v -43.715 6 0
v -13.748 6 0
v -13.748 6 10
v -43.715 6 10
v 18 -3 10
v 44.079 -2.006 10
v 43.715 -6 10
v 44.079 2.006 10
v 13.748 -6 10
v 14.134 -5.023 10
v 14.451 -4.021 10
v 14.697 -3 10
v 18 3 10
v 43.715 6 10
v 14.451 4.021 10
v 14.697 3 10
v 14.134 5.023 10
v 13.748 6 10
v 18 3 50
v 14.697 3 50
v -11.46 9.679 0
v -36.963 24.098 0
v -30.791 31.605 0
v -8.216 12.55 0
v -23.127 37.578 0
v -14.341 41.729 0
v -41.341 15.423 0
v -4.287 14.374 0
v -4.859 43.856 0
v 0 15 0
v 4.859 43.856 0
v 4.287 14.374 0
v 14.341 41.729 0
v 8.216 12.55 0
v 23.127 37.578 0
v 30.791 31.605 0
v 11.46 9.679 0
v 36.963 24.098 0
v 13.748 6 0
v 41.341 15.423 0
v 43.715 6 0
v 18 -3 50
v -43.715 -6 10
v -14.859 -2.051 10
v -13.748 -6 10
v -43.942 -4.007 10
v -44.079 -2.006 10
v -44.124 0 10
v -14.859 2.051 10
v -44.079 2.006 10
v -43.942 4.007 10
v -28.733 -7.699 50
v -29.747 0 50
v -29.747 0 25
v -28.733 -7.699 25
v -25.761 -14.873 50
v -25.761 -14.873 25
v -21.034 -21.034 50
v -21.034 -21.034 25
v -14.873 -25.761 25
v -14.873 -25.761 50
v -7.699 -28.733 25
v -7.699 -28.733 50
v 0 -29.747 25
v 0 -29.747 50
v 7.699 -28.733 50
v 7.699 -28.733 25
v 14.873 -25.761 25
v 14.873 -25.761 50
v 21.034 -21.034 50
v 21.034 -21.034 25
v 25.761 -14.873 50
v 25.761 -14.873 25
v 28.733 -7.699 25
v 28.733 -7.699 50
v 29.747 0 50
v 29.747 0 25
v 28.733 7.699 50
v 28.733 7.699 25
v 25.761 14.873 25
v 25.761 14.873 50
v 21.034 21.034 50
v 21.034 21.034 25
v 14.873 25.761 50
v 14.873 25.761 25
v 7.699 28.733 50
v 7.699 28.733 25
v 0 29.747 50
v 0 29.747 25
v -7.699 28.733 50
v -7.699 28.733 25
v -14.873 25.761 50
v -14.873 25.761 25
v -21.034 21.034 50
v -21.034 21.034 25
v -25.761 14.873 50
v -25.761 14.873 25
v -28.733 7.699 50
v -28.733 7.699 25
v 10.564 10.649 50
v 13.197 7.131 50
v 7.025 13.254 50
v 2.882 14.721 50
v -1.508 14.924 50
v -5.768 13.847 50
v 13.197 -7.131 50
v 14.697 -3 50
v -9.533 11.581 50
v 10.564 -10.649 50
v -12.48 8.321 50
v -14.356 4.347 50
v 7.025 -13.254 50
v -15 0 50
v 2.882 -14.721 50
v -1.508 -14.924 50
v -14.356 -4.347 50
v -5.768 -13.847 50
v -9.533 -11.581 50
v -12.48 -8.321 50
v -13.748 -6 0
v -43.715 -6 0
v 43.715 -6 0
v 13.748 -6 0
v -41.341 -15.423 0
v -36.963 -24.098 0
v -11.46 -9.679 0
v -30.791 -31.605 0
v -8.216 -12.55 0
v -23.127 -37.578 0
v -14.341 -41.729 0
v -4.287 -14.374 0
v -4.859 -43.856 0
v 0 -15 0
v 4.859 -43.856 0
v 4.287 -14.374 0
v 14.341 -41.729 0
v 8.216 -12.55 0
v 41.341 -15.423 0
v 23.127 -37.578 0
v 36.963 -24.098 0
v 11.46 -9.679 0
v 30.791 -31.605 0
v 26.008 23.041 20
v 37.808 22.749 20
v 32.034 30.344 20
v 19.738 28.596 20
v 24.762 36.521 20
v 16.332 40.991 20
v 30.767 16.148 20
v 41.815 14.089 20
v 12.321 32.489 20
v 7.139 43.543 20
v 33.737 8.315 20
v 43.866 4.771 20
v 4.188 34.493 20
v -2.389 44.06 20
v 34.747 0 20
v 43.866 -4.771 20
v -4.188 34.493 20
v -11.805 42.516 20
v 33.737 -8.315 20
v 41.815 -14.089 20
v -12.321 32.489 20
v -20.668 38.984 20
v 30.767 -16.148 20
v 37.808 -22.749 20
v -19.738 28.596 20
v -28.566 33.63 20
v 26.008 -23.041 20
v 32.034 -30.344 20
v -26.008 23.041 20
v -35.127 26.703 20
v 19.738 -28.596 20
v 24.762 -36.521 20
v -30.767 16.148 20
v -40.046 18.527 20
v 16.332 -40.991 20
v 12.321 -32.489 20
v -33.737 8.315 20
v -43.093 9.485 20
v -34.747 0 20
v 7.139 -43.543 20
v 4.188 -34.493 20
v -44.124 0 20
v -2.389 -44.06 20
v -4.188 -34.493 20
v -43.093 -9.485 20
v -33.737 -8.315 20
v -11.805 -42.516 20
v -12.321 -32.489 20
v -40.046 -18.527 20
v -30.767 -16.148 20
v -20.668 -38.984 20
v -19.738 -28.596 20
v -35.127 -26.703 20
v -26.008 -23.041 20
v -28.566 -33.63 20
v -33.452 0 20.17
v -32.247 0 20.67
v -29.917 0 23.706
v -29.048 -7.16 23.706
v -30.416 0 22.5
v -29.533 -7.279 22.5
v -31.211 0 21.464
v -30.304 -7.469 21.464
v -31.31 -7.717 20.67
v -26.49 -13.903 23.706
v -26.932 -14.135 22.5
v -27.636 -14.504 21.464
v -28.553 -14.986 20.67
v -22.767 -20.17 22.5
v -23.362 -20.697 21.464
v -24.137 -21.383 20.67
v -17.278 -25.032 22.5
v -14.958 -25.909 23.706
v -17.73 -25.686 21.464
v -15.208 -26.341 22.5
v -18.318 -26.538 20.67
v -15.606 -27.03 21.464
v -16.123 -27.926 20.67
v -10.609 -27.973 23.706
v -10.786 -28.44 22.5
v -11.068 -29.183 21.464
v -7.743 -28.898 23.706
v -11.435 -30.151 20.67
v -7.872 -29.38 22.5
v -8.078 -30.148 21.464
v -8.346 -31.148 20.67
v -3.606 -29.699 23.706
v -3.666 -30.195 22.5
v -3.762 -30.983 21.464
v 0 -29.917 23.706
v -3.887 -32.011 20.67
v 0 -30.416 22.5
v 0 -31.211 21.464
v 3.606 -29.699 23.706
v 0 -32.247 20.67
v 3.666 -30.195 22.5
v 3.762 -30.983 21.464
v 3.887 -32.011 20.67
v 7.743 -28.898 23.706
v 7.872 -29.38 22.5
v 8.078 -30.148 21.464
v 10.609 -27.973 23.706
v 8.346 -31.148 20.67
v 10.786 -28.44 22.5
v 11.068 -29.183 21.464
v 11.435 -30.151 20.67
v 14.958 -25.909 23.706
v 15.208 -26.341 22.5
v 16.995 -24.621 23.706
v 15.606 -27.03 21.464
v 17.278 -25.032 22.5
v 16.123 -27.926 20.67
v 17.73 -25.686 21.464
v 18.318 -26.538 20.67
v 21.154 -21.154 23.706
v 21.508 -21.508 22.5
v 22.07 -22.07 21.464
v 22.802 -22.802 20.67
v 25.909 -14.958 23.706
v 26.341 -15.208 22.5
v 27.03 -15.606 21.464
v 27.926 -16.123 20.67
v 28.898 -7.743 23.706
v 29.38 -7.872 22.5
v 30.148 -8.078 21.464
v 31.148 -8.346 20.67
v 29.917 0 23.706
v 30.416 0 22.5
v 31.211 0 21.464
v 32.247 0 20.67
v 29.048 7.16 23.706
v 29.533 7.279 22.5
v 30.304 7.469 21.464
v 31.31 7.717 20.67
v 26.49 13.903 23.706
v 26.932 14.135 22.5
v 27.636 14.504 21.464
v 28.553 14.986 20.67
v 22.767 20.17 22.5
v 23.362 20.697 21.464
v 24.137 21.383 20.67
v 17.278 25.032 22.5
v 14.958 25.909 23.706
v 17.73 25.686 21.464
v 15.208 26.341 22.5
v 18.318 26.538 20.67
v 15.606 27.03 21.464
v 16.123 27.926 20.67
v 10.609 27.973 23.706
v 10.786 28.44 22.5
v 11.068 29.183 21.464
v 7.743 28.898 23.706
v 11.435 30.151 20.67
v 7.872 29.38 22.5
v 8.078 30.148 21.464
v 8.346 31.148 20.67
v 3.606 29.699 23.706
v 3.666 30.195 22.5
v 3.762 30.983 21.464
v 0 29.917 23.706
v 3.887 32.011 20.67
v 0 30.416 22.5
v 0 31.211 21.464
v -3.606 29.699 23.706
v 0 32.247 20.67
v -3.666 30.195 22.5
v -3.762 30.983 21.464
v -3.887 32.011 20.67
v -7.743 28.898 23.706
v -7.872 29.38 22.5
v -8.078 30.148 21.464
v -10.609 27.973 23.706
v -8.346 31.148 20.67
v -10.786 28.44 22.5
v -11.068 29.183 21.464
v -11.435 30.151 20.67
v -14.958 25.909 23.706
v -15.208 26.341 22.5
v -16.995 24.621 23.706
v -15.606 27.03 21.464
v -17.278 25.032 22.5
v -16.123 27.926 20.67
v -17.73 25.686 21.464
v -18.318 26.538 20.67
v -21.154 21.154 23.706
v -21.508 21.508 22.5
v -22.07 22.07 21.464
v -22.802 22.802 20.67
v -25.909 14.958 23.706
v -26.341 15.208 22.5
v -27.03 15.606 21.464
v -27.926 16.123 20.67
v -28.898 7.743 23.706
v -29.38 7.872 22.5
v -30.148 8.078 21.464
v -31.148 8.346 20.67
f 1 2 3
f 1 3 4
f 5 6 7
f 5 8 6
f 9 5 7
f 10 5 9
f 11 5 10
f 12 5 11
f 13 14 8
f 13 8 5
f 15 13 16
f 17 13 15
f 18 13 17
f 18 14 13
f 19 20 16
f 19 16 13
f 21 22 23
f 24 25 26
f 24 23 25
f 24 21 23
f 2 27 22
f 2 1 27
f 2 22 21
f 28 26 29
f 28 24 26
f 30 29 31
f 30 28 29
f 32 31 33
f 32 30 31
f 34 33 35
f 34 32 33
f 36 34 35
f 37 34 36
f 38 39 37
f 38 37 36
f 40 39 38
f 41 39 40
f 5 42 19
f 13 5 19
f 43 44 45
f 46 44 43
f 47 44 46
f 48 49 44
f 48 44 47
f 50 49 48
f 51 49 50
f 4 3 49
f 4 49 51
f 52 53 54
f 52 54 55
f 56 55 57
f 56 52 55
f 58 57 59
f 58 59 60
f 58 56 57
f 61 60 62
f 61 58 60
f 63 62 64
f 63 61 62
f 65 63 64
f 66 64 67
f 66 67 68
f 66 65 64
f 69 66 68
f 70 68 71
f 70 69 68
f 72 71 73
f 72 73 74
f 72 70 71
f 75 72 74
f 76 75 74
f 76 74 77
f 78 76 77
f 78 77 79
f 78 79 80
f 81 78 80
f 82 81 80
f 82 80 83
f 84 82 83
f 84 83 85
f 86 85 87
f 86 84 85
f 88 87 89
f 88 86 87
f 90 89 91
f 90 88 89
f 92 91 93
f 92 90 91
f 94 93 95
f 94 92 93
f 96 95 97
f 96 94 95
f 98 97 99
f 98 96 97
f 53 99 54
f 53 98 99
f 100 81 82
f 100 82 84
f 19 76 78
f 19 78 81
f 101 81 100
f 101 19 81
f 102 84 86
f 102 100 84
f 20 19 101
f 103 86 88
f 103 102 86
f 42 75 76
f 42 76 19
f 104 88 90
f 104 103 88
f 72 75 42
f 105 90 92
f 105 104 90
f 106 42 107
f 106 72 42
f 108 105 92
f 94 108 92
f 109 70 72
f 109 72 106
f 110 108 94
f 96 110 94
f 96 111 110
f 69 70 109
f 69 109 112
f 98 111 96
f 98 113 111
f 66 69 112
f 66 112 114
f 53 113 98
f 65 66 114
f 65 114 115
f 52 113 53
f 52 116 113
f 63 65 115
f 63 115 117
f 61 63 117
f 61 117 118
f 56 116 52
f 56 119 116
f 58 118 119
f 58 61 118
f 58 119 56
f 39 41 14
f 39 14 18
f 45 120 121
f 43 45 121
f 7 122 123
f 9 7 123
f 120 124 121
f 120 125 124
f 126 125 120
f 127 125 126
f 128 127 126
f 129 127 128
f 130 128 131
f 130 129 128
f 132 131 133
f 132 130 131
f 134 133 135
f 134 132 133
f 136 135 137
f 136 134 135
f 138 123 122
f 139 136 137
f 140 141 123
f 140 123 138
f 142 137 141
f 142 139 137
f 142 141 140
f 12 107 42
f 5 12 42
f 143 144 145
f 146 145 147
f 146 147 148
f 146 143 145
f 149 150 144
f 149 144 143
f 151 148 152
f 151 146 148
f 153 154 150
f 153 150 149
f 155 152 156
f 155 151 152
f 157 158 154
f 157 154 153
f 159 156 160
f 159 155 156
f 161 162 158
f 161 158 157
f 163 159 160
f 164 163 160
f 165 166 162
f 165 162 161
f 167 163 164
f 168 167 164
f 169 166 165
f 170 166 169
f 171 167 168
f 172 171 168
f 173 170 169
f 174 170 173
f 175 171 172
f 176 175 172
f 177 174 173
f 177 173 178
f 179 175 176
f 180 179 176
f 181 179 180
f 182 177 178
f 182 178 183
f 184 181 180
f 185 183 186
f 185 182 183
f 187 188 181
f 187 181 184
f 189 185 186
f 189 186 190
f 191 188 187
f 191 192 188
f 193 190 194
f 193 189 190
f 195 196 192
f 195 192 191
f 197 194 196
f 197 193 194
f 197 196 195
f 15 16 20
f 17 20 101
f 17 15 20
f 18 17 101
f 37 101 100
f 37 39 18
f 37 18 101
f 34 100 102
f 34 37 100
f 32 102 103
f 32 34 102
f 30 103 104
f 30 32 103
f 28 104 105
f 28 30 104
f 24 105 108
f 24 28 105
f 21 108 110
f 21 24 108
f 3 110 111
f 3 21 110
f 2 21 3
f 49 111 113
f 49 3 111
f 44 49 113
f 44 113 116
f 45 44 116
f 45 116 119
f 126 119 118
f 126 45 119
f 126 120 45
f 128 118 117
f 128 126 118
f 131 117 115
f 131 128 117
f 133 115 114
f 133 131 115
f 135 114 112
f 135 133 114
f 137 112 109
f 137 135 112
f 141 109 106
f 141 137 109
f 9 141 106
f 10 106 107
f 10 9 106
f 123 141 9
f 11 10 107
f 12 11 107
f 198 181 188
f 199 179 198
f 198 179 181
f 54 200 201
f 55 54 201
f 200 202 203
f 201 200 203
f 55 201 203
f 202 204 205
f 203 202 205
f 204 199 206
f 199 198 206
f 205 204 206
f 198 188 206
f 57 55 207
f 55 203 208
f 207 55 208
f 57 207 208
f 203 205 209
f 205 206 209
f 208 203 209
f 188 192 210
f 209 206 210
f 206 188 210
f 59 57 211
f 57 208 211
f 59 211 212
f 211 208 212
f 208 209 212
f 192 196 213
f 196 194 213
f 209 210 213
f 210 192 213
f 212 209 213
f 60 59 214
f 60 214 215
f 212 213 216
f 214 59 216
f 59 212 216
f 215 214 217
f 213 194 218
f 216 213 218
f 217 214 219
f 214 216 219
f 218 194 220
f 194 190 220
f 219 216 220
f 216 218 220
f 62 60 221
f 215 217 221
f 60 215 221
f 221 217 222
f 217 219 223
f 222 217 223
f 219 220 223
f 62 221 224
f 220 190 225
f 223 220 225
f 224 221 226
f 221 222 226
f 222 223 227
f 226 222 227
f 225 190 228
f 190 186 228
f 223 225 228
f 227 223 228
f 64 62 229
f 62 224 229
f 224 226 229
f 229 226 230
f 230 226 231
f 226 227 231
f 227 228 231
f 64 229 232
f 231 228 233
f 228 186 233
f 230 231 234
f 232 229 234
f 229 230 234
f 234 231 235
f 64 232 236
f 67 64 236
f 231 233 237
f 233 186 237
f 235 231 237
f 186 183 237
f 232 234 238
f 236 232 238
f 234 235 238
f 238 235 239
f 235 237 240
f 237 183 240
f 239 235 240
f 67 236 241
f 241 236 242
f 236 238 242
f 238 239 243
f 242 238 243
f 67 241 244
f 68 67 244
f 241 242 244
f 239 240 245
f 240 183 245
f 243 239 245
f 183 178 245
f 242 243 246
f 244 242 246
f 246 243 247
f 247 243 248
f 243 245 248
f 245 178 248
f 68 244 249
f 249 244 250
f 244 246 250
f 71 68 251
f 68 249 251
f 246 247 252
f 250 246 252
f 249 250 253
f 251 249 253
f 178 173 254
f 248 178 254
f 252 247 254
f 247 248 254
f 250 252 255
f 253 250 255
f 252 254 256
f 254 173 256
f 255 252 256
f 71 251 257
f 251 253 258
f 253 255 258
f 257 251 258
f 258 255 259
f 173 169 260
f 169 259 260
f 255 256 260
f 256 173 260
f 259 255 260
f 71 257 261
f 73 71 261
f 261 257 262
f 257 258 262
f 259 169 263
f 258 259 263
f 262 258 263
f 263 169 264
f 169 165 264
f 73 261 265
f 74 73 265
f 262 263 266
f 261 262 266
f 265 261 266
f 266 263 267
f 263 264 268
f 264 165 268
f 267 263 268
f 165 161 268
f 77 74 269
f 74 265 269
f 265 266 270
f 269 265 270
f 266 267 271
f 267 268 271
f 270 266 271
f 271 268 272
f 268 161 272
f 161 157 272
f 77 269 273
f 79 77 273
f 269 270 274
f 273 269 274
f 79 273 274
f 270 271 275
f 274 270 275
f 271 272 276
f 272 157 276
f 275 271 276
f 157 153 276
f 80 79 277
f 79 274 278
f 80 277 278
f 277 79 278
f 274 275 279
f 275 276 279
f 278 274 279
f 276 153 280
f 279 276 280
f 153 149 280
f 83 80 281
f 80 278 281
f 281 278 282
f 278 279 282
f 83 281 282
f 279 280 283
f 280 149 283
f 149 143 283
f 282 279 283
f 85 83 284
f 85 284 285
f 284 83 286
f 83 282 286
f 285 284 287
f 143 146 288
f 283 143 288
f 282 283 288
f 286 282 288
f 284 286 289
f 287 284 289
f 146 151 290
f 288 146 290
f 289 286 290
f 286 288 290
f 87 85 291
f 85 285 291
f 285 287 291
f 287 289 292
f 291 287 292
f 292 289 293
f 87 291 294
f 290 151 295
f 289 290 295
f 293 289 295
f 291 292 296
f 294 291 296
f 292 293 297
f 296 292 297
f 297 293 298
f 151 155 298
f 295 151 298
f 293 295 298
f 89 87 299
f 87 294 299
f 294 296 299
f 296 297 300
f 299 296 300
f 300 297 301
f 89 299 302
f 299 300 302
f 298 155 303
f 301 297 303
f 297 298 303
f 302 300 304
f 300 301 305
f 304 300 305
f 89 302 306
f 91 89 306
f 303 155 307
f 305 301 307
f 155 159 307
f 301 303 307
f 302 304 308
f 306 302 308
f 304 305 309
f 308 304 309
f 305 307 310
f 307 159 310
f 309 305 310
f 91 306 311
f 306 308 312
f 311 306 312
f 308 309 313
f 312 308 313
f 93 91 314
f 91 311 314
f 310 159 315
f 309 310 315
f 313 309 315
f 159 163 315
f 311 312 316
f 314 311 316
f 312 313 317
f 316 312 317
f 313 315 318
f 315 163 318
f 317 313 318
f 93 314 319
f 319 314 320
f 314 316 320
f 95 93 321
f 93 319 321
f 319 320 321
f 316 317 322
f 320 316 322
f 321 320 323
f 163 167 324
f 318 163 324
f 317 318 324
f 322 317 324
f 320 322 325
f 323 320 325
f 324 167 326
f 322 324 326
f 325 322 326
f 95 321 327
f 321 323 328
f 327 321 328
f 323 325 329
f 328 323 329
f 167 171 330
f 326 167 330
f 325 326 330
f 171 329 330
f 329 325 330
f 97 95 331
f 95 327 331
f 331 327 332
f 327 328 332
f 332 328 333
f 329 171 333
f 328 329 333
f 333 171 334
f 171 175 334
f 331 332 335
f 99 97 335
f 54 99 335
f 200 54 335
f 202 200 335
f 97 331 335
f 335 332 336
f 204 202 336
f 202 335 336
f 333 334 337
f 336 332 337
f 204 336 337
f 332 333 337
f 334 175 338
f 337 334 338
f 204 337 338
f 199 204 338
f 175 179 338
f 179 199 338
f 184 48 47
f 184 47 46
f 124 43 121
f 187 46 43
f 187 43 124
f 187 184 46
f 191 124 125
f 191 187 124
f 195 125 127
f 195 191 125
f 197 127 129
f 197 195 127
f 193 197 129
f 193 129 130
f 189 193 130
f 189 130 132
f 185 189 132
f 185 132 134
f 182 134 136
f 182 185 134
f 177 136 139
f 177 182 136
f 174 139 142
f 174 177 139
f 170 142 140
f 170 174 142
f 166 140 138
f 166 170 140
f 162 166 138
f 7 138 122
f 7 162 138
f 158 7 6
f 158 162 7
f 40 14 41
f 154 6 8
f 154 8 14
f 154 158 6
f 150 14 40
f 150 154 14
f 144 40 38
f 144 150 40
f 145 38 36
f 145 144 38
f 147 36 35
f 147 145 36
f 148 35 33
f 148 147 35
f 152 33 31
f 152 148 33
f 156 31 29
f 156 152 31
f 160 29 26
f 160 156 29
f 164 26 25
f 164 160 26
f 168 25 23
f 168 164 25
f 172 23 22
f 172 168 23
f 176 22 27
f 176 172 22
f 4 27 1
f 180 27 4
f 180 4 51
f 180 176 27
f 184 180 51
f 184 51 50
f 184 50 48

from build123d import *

# Parameters (mm, degrees)
SKETCH2_W          = 118.314728146
SKETCH2_H          = 12
CUT_EXTRUDE1_DEPTH = 10
SKETCH3_W          = 4
SKETCH3_H          = 6
CUT_EXTRUDE2_DEPTH = 80.962050875
FILLET1_R          = 5


with BuildPart() as part:
    # Sketch1 → Revolve1 (revolve)
    with BuildSketch(Plane(origin=(0, 0, 0), x_dir=(0, 0, -1), z_dir=(1, 0, 0)), mode=Mode.PRIVATE) as revolve1_sk:
        Polygon((0, 15), (0, 44.124423963), (-20, 44.124423963), (-20, 29.746543779), (-50, 29.746543779), (-50, 15), align=None)
    revolve(revolve1_sk.sketch.rotate(Axis((0, 0, 0), (0, 0, 1)), 90), axis=Axis((0, 0, 0), (0, 0, 1)))

    # Sketch2 → Cut-Extrude1 (cut)
    with BuildSketch(Plane(origin=(0, 0, 0), x_dir=(-1, 0, 0), z_dir=(0, 0, -1))):
        Rectangle(SKETCH2_W, SKETCH2_H)
    extrude(amount=-CUT_EXTRUDE1_DEPTH, mode=Mode.SUBTRACT)

    # Sketch3 → Cut-Extrude2 (cut, through all)
    with BuildSketch(Plane.XY.offset(50)):
        with Locations((16, 0)):
            Rectangle(SKETCH3_W, SKETCH3_H)
    extrude(amount=-CUT_EXTRUDE2_DEPTH, mode=Mode.SUBTRACT)

    # Fillet1
    fillet1_edges = [part.edges().sort_by_distance(p)[0] for p in [
        (29.746543779, 0, 20),
    ]]
    fillet(fillet1_edges, radius=FILLET1_R)


solid = part.part
